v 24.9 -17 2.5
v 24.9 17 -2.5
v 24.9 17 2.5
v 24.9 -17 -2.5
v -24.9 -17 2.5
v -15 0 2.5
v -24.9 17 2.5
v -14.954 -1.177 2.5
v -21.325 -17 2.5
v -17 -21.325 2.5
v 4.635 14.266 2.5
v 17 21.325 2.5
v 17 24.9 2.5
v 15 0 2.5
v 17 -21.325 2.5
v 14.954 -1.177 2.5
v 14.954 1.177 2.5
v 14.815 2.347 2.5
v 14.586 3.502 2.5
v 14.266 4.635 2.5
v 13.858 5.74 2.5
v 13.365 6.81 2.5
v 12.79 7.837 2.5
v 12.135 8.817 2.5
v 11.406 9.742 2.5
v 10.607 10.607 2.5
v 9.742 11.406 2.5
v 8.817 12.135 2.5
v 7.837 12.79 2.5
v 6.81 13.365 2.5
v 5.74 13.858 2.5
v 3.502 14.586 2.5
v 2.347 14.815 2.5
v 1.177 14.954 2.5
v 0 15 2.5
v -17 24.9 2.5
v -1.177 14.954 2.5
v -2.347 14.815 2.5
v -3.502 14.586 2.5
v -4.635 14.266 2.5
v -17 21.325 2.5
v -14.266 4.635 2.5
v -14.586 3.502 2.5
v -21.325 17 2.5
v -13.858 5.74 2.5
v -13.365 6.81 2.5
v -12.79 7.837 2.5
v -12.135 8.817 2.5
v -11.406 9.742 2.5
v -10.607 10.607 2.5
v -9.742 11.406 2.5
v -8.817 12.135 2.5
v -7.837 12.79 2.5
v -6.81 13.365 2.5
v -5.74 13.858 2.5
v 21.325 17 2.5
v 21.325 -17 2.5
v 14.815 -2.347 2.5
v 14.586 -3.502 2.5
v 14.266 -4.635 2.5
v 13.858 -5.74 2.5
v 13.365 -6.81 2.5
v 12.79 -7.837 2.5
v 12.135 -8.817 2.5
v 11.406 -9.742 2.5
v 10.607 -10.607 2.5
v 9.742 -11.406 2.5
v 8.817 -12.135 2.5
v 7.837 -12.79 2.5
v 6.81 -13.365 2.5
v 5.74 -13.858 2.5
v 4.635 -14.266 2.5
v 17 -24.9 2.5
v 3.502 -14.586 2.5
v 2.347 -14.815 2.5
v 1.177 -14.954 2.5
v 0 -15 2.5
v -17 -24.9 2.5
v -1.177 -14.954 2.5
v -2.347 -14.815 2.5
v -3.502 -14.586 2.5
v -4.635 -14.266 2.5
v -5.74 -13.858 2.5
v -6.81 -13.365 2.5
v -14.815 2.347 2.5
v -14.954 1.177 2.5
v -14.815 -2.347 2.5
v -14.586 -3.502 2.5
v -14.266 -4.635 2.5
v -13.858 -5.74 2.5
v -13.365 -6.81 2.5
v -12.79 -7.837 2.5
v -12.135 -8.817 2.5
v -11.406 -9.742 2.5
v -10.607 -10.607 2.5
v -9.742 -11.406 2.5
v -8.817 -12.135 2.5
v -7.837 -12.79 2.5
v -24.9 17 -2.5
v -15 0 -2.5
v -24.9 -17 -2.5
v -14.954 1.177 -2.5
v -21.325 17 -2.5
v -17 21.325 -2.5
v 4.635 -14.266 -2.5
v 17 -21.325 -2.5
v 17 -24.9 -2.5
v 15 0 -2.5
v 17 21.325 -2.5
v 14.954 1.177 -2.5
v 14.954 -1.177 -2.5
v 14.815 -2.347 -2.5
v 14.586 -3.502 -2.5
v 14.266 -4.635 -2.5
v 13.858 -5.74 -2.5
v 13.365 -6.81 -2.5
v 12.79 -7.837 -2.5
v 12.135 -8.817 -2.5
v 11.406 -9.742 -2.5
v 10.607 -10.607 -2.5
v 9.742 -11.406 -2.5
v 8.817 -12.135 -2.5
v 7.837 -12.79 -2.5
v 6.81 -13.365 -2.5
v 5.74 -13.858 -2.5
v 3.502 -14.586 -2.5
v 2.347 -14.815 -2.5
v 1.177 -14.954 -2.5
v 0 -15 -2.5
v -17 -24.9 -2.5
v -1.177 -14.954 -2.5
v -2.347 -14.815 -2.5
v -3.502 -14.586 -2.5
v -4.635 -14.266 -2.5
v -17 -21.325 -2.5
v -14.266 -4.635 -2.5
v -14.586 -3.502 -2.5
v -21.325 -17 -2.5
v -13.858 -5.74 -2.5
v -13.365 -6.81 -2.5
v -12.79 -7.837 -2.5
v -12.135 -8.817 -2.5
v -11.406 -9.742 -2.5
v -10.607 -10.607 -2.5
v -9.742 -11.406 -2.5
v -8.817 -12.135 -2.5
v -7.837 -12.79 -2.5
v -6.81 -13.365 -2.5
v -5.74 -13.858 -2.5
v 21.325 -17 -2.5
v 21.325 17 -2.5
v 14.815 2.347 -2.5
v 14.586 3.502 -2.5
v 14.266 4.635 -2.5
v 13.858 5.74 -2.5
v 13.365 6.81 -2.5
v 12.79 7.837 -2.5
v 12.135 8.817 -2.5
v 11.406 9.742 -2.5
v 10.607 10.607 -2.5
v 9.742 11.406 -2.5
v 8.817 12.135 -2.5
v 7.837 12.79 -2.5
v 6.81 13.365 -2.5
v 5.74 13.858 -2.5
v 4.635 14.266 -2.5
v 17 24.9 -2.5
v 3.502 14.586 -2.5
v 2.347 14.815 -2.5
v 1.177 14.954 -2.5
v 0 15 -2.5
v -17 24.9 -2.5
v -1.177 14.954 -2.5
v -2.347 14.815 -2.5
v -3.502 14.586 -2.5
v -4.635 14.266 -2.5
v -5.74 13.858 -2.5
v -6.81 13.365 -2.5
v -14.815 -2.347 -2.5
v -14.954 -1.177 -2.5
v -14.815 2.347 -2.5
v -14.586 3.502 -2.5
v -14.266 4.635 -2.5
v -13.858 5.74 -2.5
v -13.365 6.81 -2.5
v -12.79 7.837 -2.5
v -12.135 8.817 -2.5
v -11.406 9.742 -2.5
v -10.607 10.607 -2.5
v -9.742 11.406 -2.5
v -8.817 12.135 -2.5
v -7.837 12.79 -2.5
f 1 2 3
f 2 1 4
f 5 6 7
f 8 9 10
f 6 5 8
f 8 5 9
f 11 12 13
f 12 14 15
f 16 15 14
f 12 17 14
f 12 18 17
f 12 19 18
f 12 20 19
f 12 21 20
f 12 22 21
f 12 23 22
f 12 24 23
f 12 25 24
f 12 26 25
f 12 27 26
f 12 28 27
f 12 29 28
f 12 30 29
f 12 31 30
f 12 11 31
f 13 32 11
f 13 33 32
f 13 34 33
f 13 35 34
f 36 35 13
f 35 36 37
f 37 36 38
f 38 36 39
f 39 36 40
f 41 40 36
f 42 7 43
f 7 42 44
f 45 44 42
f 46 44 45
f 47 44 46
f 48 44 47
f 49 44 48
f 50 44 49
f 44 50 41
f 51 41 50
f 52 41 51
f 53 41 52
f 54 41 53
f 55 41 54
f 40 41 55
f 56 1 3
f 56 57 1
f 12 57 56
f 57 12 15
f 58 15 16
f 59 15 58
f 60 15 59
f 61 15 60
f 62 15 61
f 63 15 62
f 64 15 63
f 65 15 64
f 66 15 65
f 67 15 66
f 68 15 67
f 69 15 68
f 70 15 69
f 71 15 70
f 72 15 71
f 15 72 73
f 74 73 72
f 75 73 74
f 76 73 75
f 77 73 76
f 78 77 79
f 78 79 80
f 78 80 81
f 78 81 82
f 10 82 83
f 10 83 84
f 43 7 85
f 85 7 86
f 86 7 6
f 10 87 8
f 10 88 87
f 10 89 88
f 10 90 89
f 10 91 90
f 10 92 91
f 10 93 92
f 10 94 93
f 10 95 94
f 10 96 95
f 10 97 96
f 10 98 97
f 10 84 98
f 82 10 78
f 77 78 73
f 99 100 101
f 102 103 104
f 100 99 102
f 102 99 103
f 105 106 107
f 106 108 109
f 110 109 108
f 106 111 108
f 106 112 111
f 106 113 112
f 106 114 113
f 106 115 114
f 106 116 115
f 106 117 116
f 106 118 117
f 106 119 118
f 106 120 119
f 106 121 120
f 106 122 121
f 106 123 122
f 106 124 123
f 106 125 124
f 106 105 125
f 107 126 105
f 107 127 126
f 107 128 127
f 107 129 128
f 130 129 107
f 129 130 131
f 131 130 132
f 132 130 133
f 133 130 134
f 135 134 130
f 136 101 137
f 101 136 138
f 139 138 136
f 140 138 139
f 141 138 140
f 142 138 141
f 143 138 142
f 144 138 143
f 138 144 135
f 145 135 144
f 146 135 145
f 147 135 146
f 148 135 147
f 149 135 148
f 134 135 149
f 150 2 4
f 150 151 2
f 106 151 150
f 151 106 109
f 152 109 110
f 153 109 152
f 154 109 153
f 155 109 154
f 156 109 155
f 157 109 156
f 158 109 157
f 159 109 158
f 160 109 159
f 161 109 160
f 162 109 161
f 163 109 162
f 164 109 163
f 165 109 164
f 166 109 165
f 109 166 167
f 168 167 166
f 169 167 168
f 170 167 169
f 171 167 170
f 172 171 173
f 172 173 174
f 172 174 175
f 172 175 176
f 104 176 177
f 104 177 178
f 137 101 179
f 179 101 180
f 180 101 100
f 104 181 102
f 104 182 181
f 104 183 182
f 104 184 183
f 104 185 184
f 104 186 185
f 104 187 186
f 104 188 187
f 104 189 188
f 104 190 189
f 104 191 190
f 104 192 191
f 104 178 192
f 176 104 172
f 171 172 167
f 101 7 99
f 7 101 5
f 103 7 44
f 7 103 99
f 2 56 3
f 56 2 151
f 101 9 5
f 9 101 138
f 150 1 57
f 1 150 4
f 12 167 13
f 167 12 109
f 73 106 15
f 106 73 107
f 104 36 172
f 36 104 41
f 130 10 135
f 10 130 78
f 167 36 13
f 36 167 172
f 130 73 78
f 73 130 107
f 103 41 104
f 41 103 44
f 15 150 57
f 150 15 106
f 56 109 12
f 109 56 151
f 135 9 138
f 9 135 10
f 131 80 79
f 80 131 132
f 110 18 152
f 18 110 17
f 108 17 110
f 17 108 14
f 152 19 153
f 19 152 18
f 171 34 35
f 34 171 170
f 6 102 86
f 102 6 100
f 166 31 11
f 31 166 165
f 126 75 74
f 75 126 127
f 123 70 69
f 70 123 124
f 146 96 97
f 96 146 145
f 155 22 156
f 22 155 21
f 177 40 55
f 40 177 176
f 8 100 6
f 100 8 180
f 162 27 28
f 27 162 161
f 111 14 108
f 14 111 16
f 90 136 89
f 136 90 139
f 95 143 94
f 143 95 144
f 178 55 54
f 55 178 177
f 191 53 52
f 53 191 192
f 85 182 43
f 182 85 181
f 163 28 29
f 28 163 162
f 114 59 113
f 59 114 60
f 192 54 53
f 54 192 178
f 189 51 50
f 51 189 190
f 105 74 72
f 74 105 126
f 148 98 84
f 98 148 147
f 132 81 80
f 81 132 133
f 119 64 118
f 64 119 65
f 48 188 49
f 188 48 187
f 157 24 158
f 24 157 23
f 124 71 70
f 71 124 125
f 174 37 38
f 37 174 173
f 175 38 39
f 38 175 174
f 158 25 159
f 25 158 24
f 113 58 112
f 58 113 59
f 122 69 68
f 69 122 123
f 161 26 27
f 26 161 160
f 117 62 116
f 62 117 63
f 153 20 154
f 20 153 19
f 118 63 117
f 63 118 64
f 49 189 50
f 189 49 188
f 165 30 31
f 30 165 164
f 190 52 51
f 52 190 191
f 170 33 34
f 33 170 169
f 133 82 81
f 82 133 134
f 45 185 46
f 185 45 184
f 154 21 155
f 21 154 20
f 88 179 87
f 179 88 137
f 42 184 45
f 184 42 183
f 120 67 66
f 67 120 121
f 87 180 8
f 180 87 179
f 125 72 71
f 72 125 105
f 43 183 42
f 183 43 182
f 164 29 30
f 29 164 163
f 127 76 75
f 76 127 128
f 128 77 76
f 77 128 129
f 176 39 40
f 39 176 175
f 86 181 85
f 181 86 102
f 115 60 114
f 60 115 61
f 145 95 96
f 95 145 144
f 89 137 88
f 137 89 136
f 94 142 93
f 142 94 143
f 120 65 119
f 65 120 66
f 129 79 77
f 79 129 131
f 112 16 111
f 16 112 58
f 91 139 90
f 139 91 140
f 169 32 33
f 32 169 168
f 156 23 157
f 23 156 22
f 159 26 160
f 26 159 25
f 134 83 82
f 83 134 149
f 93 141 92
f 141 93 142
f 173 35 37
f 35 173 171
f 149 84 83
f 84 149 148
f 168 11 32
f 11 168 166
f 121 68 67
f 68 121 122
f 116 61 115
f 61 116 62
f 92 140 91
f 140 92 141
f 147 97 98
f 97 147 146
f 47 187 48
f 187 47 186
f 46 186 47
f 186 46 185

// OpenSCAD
//Cube insert: Perpendicular 
/* [User] */
eyepiece_diameter = 30; //[10:0.01:42]
// Is this insert for a 3D printed cube or for a cube produced by injection molding?
3D_printed_cube = "IM"; // [IM, 3Dprint]

/* [Hiden] */
$fn = 80;
eps = .002;
a = 49.8;
b = 33.6;
c = 6.28;
d = 53.8;
h = 5;
IM_offset = 3D_printed_cube == "3Dprint" ? 0 : 0.2;

insert();

module insert() {
    difference() {
        union() {   //basic insert design
                cube([a,b+2*IM_offset,h], center=true);
                cube([b+2*IM_offset,a,h], center=true);
                rotate(a=[0,0,45]){
                    cube([c,d+2*IM_offset,h], center=true);
                }
                rotate(a=[0,0,-45]){
                    cube([c,d+2*IM_offset,h], center=true);
                }
            }
        cylinder(h+eps,d=eyepiece_diameter, center = true);
    }
}
